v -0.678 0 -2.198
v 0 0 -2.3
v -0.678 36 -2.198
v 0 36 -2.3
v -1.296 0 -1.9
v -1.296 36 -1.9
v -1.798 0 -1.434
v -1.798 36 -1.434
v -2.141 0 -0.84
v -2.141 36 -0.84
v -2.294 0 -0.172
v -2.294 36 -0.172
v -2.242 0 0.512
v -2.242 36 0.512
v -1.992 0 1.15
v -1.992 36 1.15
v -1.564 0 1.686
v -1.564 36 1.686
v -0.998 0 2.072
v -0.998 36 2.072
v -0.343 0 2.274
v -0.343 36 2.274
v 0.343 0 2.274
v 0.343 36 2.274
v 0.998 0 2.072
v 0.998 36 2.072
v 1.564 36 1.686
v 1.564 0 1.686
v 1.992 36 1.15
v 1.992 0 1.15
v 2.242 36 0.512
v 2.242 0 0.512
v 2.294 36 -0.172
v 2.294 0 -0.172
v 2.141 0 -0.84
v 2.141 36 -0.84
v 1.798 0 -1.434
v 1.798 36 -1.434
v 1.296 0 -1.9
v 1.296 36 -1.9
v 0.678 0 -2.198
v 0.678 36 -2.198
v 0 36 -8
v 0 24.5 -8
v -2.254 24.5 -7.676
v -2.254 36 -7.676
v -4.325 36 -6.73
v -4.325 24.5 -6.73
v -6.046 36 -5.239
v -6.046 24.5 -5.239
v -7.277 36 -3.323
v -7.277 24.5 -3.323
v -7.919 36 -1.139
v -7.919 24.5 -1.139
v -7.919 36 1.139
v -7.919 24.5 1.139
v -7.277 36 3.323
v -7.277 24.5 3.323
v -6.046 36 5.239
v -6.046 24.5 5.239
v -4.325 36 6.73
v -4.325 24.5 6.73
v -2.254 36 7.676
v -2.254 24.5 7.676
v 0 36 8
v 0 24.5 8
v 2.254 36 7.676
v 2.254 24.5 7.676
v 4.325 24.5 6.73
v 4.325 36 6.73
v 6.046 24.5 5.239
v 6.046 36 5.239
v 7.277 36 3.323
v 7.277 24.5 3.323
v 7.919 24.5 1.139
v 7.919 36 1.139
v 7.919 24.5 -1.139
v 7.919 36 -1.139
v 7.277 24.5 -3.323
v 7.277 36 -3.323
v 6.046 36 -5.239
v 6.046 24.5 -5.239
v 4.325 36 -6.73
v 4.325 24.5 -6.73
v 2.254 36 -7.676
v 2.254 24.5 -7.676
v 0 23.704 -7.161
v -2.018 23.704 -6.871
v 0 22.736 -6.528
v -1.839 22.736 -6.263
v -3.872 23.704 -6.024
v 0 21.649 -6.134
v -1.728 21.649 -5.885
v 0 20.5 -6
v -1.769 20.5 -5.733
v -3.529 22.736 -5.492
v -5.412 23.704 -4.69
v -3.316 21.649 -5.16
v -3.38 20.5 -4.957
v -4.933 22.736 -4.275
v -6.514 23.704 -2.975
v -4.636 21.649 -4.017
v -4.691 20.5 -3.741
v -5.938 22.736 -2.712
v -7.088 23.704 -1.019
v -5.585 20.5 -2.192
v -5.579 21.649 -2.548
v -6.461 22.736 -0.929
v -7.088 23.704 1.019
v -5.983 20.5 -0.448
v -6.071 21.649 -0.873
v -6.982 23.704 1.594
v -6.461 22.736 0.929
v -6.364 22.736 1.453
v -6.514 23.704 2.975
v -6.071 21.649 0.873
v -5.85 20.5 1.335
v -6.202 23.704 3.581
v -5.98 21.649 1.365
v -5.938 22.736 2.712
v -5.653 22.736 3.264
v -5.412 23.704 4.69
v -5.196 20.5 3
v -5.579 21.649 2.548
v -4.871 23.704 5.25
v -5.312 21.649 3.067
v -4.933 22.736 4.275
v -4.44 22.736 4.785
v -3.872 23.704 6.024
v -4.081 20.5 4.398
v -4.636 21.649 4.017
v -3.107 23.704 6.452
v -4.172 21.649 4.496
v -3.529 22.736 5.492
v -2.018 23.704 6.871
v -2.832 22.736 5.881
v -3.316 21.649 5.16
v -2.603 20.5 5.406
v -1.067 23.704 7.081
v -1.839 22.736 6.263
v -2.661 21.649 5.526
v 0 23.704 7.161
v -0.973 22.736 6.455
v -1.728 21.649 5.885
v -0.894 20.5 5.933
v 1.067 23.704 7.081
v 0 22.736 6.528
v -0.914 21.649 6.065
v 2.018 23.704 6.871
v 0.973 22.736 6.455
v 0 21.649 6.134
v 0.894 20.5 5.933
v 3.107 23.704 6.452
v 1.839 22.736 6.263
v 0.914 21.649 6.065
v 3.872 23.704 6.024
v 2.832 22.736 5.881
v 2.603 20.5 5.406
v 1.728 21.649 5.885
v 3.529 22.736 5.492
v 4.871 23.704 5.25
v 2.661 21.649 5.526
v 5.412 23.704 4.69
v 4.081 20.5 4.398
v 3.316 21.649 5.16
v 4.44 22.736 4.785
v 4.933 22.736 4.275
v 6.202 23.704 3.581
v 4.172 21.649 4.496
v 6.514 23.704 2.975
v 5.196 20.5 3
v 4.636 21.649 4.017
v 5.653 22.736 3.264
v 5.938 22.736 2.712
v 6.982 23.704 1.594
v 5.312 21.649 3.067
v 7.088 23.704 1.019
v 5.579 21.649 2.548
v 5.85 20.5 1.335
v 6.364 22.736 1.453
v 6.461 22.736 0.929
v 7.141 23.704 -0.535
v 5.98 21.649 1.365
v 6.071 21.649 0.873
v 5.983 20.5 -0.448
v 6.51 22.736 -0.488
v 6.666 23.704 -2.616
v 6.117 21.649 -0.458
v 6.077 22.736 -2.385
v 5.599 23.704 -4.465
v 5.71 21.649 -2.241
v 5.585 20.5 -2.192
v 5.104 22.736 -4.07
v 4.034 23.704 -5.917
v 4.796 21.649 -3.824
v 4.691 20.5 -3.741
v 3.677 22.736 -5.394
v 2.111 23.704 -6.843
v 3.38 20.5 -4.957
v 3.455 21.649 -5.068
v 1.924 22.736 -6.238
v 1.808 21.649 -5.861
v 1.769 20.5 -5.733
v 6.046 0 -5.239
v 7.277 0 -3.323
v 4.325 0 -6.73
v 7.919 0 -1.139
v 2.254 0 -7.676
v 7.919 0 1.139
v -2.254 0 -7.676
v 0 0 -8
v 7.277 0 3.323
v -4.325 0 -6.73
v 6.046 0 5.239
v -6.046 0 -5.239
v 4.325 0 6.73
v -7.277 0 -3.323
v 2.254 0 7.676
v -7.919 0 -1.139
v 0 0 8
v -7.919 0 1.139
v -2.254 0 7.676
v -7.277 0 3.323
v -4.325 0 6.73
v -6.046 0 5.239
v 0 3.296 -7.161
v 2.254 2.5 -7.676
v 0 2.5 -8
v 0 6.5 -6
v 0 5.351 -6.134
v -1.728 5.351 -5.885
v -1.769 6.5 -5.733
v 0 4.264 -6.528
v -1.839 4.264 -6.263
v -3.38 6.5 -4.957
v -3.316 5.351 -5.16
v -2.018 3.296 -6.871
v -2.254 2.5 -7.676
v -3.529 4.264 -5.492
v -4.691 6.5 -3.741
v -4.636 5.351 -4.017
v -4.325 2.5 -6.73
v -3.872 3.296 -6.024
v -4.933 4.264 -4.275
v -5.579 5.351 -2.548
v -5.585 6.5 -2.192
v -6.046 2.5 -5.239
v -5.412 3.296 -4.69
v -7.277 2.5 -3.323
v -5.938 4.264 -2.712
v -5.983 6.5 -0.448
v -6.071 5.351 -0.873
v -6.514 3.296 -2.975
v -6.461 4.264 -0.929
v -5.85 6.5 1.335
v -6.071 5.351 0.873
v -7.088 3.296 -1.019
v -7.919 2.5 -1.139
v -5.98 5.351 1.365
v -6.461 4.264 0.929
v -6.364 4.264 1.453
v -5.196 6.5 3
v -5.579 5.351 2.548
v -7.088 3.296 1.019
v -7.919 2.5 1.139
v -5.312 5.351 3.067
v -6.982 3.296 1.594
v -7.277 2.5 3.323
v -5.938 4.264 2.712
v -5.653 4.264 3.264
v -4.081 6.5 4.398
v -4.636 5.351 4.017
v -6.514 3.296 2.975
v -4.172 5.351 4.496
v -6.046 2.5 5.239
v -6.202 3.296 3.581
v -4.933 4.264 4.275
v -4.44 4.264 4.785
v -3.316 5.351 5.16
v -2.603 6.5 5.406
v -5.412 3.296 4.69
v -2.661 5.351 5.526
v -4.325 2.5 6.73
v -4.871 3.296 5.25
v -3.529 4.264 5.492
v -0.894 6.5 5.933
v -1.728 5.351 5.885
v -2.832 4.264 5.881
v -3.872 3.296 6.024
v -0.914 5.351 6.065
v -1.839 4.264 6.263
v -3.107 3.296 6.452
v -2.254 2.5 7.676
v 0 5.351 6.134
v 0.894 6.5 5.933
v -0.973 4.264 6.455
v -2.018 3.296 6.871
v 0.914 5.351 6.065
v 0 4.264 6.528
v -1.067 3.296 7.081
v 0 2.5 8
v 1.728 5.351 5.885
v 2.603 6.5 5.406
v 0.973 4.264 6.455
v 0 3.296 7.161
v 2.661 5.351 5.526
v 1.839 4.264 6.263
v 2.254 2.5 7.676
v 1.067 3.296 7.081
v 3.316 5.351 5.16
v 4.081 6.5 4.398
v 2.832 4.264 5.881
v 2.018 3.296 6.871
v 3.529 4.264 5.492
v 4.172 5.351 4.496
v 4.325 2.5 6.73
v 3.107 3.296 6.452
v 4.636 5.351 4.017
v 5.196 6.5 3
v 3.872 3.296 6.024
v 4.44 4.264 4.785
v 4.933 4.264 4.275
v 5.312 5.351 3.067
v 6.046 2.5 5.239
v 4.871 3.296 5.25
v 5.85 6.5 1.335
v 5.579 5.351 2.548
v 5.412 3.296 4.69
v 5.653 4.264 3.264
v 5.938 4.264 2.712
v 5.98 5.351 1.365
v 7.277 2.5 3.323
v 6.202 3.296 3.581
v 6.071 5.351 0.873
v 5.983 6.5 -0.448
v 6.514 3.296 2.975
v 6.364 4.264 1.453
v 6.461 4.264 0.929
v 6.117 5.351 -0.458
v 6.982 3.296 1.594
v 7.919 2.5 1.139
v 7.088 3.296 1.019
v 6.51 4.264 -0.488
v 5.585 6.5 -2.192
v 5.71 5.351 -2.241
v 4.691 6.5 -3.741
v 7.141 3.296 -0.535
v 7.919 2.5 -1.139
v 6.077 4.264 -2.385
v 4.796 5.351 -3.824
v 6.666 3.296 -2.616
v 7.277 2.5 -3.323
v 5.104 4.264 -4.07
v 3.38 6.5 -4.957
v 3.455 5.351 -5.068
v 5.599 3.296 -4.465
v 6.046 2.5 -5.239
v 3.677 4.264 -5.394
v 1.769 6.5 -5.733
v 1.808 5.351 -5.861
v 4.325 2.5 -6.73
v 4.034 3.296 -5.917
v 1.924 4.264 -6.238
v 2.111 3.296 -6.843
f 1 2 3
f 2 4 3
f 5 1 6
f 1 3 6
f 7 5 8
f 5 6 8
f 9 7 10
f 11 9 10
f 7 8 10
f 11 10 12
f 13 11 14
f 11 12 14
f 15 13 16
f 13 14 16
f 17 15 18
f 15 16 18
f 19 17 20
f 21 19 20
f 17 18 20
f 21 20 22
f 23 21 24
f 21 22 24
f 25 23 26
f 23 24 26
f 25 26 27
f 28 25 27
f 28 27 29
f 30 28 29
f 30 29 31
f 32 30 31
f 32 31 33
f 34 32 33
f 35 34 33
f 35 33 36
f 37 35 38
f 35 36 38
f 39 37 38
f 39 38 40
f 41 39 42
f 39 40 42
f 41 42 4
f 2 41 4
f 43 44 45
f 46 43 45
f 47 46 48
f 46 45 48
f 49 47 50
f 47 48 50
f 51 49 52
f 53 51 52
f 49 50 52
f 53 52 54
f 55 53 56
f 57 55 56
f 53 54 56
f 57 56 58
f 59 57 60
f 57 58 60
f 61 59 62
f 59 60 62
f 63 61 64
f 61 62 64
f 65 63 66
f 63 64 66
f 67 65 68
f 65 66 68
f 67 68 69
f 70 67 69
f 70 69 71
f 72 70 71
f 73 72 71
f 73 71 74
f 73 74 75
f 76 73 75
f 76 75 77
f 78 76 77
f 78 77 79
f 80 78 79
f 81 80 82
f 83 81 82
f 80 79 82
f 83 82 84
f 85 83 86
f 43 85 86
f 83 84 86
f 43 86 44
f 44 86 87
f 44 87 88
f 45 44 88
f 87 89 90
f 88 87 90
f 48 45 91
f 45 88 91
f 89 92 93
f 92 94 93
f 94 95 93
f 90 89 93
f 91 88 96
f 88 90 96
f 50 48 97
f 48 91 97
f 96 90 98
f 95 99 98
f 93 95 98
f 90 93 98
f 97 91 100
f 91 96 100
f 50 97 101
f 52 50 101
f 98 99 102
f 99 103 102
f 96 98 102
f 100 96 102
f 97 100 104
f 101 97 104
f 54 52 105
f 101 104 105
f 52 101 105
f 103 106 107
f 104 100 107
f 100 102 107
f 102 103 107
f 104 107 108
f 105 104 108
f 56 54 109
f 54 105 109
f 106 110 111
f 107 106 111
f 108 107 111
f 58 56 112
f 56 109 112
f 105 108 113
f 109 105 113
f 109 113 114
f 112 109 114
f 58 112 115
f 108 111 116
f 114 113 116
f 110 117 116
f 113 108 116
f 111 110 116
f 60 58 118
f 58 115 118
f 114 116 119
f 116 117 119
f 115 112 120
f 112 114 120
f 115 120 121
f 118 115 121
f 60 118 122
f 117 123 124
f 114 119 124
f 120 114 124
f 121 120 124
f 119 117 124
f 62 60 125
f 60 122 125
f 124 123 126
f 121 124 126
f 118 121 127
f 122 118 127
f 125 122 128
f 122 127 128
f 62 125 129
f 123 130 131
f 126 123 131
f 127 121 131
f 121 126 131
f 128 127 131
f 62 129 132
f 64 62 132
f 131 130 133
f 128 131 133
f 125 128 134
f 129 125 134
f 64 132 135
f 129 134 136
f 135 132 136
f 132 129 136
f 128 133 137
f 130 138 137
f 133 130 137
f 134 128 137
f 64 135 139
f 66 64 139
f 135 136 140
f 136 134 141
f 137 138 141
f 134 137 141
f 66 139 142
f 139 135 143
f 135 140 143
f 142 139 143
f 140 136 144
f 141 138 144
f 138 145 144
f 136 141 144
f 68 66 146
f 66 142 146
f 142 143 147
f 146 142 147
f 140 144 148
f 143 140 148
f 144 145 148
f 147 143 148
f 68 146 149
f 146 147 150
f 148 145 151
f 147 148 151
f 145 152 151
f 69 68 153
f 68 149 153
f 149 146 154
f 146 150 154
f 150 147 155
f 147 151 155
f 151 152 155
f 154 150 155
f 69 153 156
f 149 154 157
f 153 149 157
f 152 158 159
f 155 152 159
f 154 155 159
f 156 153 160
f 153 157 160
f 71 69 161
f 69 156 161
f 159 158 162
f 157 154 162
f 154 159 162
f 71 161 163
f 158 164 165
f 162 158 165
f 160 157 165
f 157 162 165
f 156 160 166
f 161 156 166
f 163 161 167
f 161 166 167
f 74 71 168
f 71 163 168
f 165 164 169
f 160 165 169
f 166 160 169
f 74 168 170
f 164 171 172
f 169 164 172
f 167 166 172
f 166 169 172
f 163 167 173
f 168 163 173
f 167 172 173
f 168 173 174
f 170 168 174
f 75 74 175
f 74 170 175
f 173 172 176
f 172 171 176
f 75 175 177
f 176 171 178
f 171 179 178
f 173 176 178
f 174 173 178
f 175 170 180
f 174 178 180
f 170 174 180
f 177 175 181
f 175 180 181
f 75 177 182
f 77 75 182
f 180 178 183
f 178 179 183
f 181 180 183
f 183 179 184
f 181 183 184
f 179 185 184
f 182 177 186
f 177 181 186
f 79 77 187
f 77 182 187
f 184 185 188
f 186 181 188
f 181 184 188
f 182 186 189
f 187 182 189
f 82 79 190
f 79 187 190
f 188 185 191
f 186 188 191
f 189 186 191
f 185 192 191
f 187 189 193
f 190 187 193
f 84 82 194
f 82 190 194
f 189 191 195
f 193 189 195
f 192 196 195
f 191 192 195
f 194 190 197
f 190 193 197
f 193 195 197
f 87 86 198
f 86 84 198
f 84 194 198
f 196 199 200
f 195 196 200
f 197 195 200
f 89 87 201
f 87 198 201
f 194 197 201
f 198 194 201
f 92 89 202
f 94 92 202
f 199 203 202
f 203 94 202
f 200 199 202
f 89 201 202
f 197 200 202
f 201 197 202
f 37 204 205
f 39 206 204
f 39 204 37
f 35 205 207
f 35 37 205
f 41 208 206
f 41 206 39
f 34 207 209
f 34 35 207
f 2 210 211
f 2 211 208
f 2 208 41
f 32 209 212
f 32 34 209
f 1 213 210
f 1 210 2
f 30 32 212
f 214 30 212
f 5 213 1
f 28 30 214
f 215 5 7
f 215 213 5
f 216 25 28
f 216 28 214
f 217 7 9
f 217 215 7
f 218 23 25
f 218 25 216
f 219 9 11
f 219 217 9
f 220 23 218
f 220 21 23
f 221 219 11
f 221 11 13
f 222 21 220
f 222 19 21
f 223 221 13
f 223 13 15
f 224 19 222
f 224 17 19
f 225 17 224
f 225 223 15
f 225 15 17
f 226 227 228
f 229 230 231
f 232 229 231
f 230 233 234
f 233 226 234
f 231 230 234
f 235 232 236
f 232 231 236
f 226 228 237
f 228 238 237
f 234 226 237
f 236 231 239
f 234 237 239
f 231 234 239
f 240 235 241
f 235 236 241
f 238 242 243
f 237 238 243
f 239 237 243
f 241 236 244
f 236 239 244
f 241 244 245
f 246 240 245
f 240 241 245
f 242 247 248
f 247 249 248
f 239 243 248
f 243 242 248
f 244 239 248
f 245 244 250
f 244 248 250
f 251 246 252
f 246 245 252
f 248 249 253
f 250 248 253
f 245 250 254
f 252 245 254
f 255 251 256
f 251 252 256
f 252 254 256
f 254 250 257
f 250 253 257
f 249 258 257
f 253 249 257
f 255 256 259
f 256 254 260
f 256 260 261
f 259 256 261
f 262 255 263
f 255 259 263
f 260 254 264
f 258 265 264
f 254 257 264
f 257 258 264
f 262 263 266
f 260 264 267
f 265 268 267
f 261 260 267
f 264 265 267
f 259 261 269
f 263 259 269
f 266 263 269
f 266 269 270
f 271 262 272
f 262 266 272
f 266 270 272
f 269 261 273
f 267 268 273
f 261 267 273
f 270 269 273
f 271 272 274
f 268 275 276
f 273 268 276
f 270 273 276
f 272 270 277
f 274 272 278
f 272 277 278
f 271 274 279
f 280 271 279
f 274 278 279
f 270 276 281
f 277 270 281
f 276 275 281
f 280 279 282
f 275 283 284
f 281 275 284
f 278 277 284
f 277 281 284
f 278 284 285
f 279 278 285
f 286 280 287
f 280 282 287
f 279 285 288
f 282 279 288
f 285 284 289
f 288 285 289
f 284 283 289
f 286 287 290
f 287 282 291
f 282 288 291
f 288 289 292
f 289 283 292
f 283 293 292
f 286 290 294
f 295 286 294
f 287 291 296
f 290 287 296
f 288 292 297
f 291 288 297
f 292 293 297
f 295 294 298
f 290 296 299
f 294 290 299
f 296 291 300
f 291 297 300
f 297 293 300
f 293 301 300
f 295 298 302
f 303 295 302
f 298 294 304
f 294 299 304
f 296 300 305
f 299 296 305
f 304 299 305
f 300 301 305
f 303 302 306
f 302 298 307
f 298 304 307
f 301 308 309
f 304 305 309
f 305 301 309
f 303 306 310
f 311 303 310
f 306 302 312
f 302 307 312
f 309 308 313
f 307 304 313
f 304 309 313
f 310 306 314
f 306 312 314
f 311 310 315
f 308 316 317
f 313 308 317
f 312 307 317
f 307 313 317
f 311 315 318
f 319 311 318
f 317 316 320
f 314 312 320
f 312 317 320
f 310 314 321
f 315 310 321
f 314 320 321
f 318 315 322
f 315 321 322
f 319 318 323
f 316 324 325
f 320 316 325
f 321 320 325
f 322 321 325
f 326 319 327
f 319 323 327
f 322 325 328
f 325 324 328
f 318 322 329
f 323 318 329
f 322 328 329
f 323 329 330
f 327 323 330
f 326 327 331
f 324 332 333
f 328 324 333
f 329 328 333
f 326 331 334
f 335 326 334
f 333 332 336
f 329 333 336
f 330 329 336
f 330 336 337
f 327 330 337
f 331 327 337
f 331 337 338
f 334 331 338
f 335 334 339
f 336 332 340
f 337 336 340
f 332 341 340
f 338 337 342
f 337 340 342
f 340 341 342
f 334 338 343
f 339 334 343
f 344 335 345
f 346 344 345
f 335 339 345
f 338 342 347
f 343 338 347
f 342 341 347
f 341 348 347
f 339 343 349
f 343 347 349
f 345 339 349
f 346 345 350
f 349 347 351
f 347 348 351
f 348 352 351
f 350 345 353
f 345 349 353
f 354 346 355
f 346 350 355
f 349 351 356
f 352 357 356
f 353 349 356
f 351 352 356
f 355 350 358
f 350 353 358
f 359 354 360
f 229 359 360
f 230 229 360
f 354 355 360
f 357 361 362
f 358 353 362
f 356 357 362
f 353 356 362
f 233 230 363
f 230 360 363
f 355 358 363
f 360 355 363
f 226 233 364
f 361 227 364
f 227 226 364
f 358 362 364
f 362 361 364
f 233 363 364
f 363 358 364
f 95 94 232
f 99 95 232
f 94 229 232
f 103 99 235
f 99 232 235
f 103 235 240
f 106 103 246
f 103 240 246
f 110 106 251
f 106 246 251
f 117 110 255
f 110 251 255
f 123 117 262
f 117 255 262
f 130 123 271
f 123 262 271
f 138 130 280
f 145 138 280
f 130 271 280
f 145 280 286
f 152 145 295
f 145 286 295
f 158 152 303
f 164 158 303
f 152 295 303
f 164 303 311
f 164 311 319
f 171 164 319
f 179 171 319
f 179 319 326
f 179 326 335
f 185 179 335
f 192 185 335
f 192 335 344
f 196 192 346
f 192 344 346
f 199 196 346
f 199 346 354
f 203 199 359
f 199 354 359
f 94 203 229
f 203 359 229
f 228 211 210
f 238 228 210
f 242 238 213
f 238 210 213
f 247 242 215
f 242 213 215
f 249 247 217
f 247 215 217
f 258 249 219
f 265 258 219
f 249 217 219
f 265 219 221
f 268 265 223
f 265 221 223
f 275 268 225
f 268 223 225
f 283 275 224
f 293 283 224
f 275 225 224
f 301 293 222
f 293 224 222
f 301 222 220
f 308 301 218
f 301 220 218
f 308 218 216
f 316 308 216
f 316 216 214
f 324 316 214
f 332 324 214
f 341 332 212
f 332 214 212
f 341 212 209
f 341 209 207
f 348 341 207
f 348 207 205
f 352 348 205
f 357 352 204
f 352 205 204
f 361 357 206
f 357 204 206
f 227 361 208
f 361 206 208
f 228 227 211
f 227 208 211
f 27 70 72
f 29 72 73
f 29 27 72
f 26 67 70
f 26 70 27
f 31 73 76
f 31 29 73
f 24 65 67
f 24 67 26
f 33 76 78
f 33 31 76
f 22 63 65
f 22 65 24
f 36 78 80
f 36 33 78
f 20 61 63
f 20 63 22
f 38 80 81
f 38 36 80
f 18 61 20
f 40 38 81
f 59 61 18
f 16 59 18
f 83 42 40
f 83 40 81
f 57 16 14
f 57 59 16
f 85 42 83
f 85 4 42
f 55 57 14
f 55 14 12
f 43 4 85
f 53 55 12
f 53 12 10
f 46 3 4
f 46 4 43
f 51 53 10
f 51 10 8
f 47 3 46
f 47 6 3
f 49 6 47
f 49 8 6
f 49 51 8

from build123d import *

# Parameters (mm, degrees)
FILLET_1_R = 5


with BuildPart() as part:
    # Эскиз1 → Повернуть1 (revolve)
    with BuildSketch(Plane.XY, mode=Mode.PRIVATE) as revolve_1_sk:
        Polygon((2.3, 0), (2.3, 36), (7.5, 36), (8, 36), (8, 24.5), (6, 24.5), (6, 2.5), (8, 2.5), (8, 0), (6, 0), align=None)
    revolve(revolve_1_sk.sketch.rotate(Axis((0, 0, 0), (0, 1, 0)), 90), axis=Axis((0, 0, 0), (0, 1, 0)))

    # Скругление1
    # the kernel refuses this fillet: 5 mm, written as the material it adds along each edge
    with BuildSketch(Plane(origin=(0, 2.5, 0), x_dir=(0, 0, -1), z_dir=(1, 0, 0))) as fillet_1_piece_1:
        with BuildLine():
            CenterArc((11, 4), FILLET_1_R, 180, 53.130102354)
            Line((8, 0), (7.94, -0.08))
            ThreePointArc((7.94, -0.08), (7, -0.1), (6, -0.1))
            Line((6, -0.1), (5.9, 0))
            Line((5.9, 0), (5.9, 4))
            Line((5.9, 4), (6, 4))
        make_face()
    revolve(axis=Axis((0, 2.5, 0), (0, 1, 0)))
    with BuildSketch(Plane(origin=(0, 24.5, 0), x_dir=(0, 0, -1), z_dir=(1, 0, 0))) as fillet_1_piece_2:
        with BuildLine():
            CenterArc((11, -4), FILLET_1_R, 126.869897646, 53.130102354)
            Line((6, -4), (5.9, -4))
            Line((5.9, -4), (5.9, 0))
            Line((5.9, 0), (6, 0.1))
            ThreePointArc((6, 0.1), (7, 0.1), (7.94, 0.08))
            Line((7.94, 0.08), (8, 0))
        make_face()
    revolve(axis=Axis((0, 24.5, 0), (0, 1, 0)))


solid = part.part
